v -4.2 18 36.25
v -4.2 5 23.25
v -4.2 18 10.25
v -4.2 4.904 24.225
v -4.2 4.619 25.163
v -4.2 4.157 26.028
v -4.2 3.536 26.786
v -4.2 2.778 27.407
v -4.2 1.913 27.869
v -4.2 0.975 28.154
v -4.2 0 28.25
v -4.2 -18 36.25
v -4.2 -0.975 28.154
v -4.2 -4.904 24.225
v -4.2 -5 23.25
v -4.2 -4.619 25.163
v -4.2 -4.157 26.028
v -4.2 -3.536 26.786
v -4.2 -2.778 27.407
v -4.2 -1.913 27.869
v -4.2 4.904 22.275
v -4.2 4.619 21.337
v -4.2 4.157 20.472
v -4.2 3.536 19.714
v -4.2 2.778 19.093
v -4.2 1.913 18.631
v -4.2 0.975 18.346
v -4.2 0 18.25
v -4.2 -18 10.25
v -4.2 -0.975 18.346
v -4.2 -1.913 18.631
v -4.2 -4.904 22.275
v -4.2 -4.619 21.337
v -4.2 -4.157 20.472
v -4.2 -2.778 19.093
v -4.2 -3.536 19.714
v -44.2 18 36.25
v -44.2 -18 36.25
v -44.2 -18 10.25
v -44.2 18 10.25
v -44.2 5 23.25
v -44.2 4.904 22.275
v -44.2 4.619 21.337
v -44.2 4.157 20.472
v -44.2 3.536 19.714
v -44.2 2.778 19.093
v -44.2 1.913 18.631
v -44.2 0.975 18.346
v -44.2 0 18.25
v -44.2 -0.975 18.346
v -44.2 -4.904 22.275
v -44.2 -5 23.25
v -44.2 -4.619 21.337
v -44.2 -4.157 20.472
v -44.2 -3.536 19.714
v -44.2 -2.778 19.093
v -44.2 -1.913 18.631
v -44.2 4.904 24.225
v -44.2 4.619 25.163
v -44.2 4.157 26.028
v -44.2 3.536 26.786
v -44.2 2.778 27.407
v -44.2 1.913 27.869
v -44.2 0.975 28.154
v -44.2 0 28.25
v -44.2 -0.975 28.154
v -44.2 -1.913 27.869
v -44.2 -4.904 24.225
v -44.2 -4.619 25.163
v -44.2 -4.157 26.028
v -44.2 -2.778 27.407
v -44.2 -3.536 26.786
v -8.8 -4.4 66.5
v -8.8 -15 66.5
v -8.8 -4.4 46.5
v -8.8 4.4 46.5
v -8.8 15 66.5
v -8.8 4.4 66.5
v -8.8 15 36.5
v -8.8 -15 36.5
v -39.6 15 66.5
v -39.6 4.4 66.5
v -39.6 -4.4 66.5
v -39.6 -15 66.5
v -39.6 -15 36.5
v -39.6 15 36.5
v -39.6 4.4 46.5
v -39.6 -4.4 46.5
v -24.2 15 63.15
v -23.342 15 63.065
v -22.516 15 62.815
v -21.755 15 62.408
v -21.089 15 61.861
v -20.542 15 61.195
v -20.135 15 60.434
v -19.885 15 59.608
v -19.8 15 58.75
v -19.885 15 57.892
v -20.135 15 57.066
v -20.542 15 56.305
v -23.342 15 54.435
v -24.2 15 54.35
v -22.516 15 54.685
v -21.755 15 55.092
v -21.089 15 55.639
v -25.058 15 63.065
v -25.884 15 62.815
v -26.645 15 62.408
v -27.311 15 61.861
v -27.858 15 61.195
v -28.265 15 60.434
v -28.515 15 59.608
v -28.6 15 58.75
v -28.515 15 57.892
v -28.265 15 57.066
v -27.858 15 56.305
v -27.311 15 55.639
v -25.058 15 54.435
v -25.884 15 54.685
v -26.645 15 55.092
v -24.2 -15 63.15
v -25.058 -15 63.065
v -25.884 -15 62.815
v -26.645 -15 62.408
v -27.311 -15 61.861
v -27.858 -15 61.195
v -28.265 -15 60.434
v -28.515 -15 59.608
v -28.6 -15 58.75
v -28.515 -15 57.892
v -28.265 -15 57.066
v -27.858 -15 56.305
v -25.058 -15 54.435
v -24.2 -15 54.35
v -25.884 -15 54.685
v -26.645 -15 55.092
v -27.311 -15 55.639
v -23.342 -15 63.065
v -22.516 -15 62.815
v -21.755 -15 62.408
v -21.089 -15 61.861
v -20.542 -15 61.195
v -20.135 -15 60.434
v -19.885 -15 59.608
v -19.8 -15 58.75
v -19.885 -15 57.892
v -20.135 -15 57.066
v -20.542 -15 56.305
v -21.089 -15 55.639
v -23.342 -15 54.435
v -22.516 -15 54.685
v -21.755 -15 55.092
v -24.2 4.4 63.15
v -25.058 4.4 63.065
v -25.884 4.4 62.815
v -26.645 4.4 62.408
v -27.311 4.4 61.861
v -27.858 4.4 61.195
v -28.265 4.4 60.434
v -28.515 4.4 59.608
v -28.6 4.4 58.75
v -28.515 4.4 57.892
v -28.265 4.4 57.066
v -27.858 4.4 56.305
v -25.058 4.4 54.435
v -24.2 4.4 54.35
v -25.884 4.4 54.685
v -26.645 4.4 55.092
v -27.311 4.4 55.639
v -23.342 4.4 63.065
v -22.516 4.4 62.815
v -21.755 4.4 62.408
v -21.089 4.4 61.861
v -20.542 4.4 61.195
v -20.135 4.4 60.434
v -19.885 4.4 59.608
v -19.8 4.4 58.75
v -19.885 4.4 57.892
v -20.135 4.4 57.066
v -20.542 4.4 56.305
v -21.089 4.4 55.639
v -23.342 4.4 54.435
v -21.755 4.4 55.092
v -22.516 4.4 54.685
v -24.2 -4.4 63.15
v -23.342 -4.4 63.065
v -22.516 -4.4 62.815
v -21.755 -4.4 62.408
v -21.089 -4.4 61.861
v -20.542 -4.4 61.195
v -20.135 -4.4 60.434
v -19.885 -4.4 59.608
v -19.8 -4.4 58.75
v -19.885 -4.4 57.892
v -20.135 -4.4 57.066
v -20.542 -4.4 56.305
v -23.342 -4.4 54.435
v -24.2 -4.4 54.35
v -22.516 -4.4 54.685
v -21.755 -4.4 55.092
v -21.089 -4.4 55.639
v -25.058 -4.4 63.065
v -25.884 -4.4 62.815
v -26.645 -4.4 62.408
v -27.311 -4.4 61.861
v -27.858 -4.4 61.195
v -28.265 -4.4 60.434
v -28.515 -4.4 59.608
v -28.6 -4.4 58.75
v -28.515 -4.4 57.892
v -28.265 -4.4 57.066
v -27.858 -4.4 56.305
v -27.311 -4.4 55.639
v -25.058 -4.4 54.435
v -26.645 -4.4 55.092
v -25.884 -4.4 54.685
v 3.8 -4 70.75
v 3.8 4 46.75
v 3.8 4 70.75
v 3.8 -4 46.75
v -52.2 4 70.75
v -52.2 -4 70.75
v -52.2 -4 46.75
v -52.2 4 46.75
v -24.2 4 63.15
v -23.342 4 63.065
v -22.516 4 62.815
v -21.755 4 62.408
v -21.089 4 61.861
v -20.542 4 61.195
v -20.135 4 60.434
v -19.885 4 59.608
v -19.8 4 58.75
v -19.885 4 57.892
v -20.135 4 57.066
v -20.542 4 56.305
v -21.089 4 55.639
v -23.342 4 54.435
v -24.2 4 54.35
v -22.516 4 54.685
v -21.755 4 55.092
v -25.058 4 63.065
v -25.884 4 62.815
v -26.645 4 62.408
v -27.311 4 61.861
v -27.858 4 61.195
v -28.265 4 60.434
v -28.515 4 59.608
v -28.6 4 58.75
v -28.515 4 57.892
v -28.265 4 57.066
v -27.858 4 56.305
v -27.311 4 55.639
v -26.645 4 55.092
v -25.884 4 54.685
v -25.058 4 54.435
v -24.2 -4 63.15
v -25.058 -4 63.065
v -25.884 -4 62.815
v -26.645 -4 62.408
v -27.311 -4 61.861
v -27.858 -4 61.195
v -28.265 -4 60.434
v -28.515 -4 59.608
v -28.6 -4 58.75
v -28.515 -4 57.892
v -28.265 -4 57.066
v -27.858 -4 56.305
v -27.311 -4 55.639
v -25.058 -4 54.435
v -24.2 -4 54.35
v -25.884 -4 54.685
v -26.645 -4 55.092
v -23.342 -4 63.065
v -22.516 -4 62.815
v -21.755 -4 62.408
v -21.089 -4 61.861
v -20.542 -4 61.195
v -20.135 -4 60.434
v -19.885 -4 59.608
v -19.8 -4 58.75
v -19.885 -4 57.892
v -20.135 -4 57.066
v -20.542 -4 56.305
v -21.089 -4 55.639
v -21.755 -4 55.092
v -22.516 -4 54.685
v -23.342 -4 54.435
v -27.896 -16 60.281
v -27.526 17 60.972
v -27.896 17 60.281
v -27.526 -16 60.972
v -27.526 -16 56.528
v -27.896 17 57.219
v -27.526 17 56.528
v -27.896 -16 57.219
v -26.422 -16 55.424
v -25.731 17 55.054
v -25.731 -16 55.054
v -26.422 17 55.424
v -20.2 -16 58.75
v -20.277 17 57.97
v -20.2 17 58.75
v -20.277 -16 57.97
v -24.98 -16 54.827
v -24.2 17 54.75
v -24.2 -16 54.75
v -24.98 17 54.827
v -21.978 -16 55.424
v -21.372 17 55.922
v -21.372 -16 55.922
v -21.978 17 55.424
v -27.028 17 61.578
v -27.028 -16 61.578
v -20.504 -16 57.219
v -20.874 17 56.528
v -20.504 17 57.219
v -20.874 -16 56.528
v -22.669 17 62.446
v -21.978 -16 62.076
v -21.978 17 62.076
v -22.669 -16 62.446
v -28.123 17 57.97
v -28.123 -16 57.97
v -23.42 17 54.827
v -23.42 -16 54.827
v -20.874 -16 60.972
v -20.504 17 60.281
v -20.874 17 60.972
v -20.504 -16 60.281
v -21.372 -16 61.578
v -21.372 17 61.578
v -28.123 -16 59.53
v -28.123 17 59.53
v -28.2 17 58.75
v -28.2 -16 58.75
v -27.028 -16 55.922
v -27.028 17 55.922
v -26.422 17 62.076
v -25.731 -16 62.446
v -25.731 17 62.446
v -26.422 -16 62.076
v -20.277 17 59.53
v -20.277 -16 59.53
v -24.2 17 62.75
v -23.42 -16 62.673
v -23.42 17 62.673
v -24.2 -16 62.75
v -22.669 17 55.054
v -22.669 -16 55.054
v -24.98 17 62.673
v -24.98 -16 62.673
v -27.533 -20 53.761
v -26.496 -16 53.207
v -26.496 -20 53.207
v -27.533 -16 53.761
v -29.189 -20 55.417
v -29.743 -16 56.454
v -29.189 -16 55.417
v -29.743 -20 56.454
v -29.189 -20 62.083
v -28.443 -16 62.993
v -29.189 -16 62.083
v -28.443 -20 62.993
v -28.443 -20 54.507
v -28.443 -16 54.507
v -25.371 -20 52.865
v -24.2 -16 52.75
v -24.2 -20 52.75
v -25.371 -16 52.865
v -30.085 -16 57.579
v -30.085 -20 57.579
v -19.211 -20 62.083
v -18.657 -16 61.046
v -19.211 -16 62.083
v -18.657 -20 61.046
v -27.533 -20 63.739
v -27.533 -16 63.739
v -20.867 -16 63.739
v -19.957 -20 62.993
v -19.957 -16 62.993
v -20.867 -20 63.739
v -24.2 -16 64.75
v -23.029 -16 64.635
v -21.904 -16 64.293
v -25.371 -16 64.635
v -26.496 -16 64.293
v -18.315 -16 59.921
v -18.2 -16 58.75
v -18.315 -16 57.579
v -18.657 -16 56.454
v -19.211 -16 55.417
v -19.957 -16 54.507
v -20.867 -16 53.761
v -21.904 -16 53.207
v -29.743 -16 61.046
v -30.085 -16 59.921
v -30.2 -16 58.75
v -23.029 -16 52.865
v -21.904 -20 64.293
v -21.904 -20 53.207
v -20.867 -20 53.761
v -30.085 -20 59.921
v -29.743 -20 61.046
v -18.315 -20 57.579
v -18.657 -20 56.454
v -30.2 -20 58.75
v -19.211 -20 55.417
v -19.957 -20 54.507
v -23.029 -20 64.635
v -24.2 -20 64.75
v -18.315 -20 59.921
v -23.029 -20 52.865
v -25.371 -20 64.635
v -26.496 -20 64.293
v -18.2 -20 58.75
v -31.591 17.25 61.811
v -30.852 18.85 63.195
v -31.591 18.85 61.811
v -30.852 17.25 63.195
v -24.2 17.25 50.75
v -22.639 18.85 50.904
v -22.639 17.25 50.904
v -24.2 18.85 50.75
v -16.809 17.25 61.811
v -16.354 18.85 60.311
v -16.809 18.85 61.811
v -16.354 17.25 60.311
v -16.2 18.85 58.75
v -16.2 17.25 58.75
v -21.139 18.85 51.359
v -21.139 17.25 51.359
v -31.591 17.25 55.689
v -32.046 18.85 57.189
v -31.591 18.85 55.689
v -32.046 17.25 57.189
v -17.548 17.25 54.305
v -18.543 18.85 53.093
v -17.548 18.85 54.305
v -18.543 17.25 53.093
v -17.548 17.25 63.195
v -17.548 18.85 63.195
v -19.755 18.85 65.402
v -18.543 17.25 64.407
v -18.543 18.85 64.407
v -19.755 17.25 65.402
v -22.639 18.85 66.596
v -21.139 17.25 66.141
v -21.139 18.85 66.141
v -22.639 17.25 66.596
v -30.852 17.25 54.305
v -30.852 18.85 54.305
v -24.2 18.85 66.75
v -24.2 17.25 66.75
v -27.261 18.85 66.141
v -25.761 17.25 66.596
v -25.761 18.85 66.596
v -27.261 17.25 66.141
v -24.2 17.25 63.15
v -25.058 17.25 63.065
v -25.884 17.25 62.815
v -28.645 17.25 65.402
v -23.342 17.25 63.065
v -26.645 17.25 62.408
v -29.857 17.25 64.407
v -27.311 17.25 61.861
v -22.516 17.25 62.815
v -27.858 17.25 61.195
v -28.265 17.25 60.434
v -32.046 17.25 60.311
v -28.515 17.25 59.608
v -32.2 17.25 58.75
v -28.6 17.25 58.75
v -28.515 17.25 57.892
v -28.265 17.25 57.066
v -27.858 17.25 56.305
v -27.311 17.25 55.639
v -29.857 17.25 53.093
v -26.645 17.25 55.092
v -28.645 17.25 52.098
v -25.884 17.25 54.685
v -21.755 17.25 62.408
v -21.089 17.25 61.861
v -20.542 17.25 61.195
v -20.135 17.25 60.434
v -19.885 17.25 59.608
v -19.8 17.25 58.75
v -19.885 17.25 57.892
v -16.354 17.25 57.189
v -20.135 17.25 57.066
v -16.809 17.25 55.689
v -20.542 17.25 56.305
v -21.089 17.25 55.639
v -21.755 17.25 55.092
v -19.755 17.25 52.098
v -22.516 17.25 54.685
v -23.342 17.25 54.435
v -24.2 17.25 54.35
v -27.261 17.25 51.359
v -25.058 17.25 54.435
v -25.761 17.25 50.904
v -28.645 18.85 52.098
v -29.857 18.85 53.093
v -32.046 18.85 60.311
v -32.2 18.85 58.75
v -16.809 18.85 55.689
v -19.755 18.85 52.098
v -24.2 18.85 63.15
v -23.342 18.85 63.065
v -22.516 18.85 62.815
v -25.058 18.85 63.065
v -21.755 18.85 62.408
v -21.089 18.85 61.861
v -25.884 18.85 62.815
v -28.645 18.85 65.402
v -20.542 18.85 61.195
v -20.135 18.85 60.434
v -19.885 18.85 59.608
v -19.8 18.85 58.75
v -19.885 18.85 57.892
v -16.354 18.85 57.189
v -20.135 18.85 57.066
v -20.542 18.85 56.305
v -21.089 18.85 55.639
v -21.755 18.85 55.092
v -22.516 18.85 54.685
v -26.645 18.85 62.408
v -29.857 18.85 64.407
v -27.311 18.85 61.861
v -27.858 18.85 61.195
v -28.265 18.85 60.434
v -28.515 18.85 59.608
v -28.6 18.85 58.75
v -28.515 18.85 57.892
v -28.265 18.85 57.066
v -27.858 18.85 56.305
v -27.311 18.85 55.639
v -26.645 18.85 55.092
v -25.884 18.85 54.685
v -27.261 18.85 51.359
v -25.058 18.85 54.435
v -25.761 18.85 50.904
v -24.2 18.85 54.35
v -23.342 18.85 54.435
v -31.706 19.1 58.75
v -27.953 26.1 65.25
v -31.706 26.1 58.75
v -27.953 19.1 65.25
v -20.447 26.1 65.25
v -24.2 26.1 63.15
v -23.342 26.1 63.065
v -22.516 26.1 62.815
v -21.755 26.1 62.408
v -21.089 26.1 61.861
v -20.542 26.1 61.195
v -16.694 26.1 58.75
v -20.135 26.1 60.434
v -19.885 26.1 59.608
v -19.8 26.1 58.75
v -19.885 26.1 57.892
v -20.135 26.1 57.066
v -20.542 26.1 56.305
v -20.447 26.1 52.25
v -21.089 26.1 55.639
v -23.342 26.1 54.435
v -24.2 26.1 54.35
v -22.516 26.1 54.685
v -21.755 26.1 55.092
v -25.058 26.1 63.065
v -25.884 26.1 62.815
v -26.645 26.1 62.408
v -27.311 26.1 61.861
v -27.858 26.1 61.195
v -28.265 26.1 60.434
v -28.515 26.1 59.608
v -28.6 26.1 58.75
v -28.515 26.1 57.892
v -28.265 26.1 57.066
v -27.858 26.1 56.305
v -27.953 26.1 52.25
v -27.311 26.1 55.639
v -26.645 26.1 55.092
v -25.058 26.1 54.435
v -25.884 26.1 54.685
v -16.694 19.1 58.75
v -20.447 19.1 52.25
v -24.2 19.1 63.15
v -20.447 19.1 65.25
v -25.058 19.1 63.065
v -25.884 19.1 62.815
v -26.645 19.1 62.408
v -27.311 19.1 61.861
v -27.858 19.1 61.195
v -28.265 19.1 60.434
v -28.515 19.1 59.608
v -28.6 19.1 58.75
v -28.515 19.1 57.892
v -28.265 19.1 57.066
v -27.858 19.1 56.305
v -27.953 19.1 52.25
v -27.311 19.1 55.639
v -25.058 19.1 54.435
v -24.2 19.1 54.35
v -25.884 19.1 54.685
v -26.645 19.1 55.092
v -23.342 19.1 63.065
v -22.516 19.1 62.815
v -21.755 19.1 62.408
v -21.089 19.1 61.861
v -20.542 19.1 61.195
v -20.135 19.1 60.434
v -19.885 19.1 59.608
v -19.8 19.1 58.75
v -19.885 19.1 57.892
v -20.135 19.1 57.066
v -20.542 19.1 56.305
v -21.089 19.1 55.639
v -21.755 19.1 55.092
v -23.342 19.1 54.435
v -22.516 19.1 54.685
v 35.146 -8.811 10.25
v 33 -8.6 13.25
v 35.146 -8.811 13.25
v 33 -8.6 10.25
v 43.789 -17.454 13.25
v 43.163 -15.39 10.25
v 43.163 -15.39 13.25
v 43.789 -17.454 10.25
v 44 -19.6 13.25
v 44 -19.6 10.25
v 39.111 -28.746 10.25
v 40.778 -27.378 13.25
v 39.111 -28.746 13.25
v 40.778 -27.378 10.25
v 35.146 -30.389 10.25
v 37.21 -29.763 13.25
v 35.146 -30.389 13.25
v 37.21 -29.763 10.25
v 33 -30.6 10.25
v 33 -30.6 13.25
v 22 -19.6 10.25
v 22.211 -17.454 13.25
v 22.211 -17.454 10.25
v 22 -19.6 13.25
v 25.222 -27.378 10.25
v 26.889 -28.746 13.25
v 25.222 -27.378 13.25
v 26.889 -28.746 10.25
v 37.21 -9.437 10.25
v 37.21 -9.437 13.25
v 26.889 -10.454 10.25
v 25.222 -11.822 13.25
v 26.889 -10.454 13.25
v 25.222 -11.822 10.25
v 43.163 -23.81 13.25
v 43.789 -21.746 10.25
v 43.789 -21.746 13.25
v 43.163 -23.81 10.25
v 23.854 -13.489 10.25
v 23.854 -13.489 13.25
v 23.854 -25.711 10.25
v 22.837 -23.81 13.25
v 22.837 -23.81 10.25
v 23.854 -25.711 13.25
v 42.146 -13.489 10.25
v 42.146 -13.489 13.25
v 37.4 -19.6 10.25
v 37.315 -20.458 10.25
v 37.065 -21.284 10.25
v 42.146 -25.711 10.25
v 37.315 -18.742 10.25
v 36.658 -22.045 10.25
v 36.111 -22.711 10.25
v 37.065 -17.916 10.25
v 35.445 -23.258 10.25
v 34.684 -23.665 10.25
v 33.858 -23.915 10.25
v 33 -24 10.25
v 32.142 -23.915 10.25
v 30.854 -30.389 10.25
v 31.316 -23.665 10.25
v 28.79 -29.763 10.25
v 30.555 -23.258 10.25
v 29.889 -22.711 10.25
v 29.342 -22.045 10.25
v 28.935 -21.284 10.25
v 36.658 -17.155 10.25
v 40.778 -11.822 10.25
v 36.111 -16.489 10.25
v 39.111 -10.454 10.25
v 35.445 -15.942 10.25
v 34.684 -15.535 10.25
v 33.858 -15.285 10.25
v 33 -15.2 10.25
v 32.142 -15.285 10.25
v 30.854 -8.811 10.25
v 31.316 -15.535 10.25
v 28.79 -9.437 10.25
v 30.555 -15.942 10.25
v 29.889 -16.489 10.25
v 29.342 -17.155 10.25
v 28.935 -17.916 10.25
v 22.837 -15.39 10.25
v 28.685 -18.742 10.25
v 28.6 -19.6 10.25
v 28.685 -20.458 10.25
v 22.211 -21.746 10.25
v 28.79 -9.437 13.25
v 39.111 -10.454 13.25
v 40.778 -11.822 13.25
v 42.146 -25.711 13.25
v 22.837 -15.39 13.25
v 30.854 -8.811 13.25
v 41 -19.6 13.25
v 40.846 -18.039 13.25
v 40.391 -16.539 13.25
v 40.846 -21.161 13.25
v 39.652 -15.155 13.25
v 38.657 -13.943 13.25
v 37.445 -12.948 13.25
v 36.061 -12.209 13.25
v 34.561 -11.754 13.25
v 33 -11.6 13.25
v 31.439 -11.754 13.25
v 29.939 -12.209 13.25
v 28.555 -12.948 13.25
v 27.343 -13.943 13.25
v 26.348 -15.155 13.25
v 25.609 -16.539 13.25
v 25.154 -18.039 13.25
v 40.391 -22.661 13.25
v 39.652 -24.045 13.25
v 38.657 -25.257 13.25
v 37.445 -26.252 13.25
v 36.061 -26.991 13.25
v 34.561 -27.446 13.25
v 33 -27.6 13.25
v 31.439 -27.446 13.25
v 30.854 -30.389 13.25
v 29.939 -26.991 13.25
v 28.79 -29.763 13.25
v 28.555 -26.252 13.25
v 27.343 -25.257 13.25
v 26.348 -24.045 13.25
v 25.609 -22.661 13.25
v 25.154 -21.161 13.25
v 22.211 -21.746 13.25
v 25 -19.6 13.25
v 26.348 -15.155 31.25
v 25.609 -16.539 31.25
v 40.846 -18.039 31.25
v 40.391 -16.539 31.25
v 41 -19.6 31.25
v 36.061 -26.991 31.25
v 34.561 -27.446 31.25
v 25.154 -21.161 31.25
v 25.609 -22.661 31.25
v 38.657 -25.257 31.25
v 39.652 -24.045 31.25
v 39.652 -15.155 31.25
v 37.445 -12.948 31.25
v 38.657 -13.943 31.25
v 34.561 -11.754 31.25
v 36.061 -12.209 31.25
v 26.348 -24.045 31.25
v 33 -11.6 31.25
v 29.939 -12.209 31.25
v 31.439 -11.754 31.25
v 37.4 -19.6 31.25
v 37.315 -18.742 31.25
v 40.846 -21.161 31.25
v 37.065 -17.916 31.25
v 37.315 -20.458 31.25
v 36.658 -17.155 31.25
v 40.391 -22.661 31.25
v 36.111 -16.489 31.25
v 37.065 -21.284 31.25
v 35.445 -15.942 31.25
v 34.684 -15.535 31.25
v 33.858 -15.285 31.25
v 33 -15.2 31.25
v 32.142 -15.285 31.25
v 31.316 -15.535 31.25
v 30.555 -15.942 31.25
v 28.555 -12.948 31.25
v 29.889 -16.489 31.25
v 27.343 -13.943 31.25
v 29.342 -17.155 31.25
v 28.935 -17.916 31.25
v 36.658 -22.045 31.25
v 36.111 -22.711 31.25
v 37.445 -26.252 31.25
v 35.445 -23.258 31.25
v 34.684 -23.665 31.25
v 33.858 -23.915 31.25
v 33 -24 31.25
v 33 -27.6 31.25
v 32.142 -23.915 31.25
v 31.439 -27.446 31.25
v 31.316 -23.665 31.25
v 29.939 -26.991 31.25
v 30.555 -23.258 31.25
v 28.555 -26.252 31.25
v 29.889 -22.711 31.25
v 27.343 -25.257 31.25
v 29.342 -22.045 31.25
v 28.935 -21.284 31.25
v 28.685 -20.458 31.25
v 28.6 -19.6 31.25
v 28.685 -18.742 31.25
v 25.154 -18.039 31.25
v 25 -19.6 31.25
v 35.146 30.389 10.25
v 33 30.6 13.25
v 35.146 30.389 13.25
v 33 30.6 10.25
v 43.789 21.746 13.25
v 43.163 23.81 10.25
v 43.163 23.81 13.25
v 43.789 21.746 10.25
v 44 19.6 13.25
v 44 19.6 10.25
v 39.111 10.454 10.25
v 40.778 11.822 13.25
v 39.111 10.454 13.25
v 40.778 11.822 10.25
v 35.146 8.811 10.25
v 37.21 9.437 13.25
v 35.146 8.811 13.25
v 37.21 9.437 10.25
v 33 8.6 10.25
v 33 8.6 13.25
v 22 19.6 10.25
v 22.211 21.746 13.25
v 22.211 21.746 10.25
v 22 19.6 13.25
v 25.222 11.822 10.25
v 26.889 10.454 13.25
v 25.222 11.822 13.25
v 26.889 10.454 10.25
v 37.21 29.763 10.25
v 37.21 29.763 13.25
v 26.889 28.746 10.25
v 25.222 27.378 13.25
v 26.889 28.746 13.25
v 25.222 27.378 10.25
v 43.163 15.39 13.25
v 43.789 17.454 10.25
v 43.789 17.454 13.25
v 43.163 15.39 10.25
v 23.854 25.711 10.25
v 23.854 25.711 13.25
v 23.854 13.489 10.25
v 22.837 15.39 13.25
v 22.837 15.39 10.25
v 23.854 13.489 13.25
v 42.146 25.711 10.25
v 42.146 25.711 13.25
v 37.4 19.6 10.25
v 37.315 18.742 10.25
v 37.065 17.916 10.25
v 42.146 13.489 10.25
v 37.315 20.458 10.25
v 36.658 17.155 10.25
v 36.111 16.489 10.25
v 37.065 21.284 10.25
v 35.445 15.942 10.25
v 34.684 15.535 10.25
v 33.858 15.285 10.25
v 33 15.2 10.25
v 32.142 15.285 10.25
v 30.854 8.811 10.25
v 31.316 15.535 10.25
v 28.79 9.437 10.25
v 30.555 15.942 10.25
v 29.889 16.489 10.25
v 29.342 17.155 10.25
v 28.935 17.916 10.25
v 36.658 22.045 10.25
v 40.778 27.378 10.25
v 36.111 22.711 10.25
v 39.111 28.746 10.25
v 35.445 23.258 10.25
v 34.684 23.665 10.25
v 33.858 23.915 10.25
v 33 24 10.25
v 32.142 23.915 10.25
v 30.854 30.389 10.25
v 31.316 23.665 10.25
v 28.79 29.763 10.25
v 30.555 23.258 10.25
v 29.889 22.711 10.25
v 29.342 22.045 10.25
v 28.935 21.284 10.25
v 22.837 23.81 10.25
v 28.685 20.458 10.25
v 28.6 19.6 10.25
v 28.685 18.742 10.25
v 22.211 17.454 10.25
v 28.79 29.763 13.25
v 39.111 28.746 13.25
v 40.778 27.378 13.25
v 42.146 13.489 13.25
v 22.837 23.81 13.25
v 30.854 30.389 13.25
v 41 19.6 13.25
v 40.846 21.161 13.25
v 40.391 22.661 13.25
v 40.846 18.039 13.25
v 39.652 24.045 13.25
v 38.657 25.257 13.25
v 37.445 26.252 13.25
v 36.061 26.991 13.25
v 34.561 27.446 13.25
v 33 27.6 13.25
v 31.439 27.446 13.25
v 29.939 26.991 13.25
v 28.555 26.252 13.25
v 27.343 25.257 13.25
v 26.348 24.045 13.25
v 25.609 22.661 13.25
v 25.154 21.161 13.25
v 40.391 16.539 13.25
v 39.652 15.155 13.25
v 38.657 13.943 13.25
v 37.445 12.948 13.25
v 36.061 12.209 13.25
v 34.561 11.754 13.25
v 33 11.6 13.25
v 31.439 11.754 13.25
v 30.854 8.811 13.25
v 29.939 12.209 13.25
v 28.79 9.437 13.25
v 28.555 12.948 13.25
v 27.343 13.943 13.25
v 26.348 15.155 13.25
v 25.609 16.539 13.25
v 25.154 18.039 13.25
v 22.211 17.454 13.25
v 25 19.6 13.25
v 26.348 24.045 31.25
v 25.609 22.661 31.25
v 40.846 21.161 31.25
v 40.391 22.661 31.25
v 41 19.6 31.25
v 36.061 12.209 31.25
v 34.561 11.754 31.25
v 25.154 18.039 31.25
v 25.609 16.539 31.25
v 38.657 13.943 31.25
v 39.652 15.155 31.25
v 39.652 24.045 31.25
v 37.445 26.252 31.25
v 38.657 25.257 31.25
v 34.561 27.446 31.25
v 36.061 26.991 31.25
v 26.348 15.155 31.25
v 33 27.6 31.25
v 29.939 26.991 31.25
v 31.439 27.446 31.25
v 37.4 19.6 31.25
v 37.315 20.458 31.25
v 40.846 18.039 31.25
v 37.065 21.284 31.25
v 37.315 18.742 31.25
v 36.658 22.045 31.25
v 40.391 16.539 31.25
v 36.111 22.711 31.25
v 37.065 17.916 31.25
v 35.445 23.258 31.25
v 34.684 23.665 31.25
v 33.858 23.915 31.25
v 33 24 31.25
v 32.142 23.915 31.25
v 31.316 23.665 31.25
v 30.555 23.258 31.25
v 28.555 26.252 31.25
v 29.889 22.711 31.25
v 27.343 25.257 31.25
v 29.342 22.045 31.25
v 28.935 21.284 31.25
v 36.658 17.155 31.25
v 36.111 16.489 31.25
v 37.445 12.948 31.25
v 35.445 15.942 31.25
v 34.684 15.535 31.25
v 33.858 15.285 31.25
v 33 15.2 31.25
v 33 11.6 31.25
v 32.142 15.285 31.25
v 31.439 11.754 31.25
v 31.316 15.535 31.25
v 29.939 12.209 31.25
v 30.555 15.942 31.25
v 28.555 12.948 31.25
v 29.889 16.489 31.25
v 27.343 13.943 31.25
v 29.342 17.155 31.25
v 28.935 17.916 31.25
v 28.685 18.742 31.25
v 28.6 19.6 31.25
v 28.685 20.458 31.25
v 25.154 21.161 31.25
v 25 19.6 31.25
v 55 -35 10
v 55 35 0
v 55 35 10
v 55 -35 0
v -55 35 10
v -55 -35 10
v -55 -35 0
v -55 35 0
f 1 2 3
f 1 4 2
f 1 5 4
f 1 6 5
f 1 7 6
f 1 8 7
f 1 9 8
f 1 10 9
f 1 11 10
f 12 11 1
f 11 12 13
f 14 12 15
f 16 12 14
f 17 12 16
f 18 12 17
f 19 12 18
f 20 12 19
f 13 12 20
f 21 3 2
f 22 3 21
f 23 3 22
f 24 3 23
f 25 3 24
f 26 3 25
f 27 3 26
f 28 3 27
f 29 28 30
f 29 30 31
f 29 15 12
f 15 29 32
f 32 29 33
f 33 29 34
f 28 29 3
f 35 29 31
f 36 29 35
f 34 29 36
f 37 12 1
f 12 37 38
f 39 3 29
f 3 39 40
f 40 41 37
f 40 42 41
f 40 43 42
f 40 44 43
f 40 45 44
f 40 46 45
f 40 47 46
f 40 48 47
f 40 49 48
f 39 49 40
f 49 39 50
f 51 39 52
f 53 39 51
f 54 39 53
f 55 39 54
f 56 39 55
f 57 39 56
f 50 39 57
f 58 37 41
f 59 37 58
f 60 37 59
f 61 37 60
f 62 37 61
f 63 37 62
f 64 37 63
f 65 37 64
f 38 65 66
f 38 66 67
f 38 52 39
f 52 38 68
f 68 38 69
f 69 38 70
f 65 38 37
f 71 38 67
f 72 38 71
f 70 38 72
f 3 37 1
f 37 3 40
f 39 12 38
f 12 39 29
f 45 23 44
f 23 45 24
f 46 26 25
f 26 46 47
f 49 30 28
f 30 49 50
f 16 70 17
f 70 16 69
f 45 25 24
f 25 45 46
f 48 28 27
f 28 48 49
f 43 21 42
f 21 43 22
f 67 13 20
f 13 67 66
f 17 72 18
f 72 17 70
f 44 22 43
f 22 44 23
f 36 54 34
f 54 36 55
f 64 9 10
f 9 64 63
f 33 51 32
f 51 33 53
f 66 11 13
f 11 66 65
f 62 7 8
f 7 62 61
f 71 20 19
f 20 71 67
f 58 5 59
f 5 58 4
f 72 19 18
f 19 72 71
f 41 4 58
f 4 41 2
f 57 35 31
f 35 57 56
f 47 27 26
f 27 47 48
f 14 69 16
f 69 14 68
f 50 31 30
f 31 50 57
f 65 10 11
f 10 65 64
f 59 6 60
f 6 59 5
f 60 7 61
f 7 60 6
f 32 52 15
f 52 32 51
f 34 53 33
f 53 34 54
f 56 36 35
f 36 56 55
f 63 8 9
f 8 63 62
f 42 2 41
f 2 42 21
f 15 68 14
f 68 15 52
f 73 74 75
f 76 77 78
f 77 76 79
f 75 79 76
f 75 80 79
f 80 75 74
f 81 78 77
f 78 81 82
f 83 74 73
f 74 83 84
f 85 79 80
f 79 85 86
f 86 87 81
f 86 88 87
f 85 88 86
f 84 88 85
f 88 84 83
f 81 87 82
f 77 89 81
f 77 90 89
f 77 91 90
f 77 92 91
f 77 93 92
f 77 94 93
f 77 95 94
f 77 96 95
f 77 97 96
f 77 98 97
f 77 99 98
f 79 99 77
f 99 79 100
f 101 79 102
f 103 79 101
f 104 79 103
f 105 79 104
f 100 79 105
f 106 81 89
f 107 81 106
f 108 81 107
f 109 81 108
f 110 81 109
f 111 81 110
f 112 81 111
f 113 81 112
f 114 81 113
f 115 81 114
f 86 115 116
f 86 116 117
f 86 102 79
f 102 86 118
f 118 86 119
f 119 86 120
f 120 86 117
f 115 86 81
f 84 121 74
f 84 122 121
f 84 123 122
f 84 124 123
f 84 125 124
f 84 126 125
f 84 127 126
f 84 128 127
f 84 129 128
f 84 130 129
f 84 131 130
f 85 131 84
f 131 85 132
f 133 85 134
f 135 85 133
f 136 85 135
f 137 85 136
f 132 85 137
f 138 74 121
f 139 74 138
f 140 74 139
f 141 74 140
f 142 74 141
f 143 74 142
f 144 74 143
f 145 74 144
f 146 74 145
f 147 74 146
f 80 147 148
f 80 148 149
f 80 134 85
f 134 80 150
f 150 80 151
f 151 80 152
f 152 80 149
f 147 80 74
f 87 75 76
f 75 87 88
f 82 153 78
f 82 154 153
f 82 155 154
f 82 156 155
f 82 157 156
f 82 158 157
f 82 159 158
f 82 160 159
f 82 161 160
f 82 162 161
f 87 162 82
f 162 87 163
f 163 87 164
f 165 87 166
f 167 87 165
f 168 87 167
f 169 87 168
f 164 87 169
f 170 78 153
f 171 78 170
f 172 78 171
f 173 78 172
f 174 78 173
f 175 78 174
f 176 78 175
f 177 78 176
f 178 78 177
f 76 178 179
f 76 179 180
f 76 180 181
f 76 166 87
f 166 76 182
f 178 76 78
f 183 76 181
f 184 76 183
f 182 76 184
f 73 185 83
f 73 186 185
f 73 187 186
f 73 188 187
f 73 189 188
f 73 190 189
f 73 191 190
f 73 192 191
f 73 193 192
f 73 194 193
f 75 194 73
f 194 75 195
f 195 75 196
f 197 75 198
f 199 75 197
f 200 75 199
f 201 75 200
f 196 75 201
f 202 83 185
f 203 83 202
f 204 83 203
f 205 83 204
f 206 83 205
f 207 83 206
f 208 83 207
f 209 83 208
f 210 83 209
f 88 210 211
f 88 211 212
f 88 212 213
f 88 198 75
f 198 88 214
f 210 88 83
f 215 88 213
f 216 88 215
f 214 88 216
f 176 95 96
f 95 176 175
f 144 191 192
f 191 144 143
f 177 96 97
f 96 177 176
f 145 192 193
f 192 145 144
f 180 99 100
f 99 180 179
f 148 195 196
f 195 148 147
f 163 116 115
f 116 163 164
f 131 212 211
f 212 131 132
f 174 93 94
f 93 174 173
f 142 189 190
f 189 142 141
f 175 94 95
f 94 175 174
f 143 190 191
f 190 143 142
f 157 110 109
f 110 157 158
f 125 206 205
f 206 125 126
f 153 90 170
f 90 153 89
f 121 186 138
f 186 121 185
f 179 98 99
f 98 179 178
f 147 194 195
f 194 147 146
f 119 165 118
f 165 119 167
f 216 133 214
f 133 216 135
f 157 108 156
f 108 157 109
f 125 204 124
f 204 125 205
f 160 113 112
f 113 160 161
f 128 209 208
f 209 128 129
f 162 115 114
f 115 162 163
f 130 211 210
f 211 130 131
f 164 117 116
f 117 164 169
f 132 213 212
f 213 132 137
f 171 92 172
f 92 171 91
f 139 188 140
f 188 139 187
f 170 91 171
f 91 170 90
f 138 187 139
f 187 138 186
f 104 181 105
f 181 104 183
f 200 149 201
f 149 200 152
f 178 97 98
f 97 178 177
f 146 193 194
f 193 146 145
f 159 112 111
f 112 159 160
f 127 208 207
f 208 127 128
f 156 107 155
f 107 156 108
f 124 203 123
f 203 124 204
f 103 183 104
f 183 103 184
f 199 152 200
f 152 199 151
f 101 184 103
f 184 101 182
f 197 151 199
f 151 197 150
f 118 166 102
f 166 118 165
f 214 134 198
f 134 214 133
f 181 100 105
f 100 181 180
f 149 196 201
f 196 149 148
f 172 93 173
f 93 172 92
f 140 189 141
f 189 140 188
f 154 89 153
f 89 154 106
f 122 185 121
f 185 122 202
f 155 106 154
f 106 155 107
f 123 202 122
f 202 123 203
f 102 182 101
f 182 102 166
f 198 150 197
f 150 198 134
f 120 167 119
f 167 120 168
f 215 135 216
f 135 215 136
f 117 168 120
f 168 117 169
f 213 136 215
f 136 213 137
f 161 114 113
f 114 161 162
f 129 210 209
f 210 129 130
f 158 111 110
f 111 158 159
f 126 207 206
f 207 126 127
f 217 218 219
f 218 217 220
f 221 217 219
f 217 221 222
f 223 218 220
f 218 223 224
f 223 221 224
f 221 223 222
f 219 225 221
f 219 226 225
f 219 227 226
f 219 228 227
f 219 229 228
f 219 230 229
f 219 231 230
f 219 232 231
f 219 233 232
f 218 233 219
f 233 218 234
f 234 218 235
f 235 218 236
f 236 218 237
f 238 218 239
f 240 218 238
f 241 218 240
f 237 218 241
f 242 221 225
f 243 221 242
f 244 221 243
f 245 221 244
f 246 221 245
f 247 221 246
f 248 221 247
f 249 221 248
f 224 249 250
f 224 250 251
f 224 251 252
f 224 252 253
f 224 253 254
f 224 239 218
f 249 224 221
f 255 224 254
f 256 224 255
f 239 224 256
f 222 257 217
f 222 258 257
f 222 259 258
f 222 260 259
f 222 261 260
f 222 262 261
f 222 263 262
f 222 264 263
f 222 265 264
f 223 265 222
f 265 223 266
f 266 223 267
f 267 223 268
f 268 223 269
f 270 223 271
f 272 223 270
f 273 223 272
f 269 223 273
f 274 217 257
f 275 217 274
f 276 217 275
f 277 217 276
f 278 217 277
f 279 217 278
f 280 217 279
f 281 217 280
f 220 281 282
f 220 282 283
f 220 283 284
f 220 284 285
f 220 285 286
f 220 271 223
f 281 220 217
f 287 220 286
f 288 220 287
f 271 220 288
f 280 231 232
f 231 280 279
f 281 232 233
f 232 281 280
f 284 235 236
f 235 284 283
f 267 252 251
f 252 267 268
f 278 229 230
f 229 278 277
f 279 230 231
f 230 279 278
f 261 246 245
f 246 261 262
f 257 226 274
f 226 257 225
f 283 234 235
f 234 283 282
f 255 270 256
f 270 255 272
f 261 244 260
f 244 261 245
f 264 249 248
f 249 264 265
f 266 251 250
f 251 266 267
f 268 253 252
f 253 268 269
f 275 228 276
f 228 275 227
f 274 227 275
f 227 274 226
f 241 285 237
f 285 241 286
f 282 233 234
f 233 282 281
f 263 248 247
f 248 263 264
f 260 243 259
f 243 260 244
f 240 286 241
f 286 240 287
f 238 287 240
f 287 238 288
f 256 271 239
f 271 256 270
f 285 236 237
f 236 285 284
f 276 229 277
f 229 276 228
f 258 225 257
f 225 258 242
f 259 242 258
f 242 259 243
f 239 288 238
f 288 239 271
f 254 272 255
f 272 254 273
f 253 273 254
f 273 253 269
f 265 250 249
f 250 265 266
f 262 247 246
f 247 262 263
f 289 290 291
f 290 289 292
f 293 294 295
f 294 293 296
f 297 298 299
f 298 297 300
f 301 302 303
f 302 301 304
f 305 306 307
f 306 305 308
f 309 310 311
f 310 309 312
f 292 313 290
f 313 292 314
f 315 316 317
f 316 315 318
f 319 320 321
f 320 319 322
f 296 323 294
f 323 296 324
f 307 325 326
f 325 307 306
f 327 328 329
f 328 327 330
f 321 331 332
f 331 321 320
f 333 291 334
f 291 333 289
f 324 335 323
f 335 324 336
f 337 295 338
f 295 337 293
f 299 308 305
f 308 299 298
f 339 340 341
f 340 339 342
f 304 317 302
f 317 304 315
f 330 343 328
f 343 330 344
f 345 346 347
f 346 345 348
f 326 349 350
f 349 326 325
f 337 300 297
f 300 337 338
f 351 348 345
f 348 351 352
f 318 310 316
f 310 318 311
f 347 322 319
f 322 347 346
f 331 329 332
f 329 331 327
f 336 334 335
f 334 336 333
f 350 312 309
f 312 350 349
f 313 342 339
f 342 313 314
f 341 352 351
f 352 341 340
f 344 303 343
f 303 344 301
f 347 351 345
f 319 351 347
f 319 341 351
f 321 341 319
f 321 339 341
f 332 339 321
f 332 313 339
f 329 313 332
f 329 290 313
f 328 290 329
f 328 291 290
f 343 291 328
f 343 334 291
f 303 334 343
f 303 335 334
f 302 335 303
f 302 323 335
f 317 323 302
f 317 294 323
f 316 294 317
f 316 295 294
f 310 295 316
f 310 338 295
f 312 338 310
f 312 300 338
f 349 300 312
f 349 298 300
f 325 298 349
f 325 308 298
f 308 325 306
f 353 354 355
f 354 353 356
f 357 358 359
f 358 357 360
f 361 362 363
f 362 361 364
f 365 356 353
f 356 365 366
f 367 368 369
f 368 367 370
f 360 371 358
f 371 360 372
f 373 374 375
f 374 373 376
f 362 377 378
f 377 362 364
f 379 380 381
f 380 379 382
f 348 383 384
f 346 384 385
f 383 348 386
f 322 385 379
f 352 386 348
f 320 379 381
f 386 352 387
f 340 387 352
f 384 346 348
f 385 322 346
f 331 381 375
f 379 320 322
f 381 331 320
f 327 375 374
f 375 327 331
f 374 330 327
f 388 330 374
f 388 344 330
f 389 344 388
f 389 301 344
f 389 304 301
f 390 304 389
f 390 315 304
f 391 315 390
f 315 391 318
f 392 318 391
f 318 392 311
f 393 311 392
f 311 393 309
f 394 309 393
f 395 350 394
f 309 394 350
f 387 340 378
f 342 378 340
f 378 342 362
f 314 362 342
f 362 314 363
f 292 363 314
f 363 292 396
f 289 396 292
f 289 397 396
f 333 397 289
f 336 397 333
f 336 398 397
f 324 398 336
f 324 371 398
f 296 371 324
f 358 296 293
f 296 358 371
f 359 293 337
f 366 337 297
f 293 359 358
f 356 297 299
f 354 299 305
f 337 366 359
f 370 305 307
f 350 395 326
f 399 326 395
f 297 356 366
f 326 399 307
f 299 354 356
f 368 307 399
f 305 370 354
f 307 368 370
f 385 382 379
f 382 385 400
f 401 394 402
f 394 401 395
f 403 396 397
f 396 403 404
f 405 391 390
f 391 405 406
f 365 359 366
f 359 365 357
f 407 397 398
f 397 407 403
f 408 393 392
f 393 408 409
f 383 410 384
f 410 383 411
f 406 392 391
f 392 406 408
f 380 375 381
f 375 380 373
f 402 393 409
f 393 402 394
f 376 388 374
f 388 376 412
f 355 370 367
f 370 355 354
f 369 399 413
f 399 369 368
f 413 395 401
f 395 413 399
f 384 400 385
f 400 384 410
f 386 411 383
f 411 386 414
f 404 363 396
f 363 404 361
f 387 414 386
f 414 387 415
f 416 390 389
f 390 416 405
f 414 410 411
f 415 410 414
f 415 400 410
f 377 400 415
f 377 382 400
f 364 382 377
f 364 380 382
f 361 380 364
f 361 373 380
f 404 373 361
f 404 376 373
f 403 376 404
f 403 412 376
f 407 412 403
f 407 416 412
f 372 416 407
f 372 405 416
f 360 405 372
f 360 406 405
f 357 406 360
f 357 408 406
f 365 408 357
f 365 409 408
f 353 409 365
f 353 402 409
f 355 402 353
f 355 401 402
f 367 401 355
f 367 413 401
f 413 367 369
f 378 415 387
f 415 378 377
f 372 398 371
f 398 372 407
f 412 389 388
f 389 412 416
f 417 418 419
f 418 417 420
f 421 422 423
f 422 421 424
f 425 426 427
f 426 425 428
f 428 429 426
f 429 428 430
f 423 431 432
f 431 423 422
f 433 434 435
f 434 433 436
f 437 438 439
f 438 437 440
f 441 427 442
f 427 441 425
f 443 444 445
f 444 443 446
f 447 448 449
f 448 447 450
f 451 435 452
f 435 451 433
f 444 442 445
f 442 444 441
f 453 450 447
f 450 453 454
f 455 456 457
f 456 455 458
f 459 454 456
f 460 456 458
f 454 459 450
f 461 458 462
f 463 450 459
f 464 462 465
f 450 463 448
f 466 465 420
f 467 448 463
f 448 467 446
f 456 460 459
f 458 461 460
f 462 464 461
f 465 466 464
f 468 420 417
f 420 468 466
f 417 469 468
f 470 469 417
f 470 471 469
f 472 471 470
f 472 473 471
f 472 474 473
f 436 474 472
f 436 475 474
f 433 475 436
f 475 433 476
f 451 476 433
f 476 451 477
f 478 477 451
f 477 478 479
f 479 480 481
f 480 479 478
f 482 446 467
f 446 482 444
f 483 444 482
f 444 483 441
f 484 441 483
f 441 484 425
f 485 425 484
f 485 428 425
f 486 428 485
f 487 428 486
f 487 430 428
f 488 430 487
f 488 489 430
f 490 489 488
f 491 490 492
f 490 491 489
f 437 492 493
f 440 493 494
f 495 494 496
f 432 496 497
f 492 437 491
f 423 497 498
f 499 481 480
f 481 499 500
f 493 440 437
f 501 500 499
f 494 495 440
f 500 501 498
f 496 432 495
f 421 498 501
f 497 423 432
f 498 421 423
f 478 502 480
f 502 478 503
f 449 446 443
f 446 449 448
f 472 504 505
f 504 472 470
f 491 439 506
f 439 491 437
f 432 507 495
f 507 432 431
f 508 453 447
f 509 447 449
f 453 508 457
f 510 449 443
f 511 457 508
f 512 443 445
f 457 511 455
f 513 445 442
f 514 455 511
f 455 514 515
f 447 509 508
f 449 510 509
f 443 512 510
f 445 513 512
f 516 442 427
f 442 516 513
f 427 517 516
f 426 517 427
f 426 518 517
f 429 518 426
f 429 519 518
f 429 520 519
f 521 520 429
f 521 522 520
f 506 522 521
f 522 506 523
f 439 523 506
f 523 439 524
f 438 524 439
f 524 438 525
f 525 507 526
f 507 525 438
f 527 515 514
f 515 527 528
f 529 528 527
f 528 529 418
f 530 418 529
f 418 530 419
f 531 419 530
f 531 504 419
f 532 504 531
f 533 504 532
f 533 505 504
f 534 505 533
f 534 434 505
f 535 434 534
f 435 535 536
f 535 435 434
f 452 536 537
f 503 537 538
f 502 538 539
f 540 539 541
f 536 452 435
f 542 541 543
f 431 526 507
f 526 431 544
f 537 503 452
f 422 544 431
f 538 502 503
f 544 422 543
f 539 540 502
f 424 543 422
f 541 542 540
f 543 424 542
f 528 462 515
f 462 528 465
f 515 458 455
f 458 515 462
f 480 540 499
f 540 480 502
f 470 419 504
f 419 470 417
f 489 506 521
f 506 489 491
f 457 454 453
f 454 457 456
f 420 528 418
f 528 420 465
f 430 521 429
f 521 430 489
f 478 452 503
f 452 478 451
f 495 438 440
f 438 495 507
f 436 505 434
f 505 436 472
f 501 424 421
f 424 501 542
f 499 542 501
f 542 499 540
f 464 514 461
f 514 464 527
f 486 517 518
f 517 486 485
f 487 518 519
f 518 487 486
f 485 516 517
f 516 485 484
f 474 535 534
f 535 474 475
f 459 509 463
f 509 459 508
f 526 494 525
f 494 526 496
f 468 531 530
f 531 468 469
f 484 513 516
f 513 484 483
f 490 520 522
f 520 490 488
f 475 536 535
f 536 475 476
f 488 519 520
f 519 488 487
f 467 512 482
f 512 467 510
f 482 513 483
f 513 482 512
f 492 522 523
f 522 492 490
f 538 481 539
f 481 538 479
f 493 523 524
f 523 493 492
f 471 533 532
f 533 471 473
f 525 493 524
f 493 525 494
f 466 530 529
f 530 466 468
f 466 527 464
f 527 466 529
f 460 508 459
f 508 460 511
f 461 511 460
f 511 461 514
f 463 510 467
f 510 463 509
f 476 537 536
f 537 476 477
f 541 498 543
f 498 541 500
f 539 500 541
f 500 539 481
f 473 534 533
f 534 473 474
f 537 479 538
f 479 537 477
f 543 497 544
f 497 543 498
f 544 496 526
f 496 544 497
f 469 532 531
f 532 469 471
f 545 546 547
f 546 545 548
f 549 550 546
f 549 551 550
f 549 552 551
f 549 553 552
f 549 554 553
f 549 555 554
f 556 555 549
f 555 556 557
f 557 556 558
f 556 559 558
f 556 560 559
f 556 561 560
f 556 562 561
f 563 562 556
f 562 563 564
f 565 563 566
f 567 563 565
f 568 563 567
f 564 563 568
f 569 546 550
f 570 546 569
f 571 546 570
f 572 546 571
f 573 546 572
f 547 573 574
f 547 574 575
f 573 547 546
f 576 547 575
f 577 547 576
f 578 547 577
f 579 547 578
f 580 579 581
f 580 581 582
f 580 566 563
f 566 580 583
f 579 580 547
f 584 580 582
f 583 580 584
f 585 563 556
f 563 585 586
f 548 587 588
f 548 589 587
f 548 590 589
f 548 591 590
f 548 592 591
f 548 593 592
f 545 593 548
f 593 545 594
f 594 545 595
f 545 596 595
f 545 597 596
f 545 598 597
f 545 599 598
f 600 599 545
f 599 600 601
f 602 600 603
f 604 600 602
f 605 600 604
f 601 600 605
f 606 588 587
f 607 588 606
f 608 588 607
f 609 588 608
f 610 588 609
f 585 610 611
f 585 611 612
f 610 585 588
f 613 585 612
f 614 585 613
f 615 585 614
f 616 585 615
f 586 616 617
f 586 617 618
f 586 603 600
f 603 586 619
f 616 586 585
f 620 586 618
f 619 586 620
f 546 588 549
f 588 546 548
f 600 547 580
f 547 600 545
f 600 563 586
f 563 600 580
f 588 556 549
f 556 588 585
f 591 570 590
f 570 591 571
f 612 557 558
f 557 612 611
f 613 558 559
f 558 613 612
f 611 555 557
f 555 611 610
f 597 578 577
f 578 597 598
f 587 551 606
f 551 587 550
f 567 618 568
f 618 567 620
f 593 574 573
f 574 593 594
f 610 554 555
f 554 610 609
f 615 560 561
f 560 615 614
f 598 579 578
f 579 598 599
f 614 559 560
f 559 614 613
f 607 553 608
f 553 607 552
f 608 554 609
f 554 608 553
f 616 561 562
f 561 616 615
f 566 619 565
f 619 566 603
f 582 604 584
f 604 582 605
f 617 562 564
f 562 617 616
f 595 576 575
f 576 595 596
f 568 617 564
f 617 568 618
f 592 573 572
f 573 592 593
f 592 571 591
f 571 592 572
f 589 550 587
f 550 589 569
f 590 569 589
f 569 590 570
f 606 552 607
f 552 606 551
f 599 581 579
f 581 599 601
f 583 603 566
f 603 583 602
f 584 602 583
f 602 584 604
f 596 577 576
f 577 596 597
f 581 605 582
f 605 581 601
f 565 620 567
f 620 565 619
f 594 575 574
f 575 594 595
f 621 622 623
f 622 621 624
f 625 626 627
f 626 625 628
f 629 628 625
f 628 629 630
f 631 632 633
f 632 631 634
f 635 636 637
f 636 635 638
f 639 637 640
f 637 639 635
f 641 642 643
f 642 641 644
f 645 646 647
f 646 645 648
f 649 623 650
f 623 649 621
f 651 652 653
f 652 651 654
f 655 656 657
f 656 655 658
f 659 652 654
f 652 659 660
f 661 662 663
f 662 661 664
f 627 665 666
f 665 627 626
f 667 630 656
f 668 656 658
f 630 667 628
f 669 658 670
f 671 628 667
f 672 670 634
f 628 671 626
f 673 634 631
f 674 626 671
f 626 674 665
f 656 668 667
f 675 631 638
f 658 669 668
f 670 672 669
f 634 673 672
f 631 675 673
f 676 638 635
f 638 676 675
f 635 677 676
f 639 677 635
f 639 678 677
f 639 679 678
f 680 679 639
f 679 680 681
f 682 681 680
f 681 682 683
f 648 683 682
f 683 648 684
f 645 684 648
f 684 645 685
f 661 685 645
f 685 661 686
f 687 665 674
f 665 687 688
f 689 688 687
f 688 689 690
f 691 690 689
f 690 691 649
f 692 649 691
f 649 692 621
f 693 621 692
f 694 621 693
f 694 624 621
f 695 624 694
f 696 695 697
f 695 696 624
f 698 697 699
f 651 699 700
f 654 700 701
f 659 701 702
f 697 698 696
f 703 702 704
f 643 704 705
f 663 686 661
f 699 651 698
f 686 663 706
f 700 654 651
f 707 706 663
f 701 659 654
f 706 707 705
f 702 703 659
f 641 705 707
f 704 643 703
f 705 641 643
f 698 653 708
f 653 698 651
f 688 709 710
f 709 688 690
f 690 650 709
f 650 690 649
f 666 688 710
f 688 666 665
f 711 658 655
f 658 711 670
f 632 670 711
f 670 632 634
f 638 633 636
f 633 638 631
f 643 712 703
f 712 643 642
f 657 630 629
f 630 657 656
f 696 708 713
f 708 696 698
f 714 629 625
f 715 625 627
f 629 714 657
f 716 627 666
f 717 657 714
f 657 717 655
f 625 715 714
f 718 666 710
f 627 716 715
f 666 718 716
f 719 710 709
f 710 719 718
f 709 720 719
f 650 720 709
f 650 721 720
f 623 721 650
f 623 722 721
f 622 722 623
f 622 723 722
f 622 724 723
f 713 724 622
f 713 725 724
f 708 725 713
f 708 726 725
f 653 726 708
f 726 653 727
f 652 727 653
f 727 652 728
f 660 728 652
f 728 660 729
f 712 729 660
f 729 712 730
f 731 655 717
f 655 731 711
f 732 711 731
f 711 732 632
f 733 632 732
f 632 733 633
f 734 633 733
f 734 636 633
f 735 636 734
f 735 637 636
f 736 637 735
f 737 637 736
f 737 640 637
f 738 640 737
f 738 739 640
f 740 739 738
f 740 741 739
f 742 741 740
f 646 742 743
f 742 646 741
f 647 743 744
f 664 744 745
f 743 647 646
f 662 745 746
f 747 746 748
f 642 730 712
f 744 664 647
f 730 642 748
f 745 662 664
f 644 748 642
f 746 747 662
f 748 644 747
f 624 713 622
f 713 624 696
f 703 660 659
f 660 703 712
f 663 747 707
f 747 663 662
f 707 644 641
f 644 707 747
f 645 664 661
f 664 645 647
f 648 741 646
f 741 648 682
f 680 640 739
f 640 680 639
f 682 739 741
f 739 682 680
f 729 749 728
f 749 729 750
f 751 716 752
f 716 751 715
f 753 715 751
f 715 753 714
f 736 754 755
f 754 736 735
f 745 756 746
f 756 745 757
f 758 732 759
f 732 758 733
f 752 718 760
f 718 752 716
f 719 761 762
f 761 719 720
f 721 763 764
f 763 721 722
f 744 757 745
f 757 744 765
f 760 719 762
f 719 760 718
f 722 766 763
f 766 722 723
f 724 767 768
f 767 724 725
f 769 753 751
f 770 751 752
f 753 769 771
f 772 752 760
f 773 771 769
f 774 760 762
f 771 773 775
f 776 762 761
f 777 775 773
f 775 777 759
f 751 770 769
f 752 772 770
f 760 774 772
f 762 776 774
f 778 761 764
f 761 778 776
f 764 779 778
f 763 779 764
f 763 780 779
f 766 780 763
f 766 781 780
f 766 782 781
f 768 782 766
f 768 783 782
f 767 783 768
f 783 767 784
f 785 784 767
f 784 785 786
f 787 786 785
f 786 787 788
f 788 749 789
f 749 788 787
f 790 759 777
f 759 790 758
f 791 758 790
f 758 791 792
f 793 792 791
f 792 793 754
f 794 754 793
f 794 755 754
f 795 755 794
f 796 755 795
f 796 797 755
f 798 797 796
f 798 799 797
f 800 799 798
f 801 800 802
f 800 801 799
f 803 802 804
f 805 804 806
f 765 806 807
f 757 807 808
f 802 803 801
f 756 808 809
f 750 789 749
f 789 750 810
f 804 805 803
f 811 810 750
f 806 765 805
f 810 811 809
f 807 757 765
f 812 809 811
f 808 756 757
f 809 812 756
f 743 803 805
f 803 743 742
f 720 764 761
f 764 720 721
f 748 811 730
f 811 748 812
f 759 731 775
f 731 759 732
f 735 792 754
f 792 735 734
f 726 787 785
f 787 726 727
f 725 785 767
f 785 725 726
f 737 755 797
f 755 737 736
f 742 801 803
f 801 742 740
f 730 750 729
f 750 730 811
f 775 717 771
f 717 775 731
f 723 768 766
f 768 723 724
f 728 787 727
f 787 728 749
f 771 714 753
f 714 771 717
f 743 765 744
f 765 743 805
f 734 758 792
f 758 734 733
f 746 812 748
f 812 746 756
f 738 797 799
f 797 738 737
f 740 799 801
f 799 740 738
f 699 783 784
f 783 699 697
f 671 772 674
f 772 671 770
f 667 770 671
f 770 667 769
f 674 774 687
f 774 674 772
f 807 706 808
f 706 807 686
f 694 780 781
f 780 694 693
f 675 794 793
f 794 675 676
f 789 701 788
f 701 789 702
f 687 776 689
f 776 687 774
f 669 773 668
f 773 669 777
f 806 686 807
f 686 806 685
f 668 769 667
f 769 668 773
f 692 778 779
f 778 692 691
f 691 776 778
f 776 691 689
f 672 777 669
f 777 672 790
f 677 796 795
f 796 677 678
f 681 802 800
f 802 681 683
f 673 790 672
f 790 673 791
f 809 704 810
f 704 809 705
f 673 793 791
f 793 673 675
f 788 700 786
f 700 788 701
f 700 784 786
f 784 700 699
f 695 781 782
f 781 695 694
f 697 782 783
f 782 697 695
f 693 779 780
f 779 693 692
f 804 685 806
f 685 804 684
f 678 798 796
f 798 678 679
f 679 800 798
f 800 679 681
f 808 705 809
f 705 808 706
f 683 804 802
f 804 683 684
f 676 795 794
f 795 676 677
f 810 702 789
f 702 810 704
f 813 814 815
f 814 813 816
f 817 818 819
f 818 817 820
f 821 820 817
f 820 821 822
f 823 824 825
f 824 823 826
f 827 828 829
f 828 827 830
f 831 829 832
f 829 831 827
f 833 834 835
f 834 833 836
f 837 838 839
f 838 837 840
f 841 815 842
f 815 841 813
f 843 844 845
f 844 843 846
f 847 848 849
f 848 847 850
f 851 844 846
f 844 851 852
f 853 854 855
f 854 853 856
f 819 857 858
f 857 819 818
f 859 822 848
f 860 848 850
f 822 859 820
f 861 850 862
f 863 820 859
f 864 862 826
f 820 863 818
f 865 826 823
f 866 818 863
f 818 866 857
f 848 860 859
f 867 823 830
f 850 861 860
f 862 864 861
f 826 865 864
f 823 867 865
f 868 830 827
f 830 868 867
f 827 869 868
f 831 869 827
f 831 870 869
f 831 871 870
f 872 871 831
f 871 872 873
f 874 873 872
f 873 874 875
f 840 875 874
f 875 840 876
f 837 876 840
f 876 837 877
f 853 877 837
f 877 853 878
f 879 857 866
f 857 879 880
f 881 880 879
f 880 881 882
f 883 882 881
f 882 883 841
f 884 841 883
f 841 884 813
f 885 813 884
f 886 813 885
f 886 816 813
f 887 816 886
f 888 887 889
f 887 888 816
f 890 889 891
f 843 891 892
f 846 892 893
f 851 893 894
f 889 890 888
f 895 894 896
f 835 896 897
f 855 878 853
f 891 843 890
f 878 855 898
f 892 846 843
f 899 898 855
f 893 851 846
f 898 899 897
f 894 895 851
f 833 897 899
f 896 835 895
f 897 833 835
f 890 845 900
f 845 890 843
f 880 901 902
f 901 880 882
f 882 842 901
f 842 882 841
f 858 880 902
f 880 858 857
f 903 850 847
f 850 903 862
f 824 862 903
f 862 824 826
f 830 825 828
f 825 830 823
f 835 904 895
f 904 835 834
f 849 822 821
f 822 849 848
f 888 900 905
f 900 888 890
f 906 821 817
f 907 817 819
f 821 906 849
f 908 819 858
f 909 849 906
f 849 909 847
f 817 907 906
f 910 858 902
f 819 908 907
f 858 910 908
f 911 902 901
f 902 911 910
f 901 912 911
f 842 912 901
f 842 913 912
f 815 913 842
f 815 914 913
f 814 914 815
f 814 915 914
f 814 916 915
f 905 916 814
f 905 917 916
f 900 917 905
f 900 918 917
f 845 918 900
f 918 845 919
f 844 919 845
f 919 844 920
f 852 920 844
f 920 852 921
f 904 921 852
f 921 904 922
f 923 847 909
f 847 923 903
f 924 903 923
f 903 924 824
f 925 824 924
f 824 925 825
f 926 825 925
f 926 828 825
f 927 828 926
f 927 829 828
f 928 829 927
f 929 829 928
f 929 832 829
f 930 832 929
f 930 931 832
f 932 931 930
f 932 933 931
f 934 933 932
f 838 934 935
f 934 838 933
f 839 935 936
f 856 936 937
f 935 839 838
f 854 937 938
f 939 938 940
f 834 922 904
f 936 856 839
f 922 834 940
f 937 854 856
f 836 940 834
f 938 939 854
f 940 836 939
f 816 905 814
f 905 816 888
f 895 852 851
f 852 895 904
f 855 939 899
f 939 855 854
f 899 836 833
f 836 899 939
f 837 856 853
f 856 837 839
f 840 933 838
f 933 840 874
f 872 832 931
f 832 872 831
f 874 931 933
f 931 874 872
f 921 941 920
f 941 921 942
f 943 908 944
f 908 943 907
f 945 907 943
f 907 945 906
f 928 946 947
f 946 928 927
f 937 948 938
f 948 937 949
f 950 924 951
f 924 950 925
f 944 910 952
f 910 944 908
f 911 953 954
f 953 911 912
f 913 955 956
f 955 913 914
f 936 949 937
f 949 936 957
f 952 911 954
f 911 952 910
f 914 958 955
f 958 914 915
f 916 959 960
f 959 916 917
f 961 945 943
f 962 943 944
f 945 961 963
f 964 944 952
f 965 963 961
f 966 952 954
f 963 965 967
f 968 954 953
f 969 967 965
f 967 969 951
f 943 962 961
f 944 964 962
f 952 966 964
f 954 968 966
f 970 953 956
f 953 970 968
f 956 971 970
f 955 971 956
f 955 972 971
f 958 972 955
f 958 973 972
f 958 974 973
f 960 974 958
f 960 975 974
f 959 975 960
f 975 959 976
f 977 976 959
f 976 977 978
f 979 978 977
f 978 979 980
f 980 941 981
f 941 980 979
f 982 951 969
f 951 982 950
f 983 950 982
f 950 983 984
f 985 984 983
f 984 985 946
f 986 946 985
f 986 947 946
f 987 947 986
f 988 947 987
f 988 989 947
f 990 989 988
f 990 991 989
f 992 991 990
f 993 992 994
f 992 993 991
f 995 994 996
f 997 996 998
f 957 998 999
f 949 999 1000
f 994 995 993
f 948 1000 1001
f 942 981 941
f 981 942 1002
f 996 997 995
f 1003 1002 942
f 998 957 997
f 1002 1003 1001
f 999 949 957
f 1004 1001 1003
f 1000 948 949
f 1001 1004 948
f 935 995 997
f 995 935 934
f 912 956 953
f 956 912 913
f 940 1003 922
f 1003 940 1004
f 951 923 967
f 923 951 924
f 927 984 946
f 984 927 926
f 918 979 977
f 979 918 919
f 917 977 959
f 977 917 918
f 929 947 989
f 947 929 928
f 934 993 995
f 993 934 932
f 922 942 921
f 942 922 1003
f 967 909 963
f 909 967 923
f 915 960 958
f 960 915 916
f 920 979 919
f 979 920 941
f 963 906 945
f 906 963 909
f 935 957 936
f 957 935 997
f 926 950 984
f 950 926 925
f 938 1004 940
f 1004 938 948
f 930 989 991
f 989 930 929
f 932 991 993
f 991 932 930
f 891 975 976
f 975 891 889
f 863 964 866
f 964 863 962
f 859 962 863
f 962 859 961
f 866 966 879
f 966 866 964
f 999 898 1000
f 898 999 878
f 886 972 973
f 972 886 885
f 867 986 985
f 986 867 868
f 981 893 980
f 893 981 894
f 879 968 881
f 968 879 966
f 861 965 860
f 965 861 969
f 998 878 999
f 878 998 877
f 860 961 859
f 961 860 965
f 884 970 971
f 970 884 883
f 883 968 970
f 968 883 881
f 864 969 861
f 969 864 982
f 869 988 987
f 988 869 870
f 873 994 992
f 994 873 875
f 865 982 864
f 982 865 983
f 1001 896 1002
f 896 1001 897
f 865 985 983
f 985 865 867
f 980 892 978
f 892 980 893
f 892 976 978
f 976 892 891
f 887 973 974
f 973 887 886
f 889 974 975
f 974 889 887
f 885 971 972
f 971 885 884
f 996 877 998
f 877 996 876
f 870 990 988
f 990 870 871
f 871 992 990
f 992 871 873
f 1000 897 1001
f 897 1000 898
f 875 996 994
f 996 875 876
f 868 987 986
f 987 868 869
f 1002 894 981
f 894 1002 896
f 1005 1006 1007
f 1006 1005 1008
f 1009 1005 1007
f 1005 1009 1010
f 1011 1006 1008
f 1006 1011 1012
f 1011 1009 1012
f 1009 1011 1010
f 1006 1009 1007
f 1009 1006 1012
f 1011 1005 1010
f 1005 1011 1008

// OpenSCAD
$fn = 32;

// ------------------------------------------------------------------------
// Indexing jig: plate 110 x 70 mm, pin d8
// Every part is its own module, assembly() places every instance.
// ------------------------------------------------------------------------

// --- part 1 ---
module jig_plate() {
  difference() {
    translate([-55, -35, 0]) cube([110, 70, 10]);
  }
}

// --- part 2 ---
module locator_block() {
  difference() {
    translate([-20, -18, 0]) cube([40, 36, 26]);
    translate([0, 0, 13]) rotate([0, 90, 0]) cylinder(h = 42, d = 10, center = true);
  }
}

// --- part 3 ---
module index_fork() {
  difference() {
    translate([-15.4, -15, 0]) cube([30.8, 30, 30]);
    translate([-16.4, -4.4, 10]) cube([32.8, 8.8, 21]);
    translate([0, 0, 22.25]) rotate([90, 0, 0]) cylinder(h = 32, d = 8.8, center = true);
  }
}

// --- part 4 ---
module index_arm() {
  difference() {
    translate([-28, -4, 0]) cube([56, 8, 24]);
    translate([0, 0, 12]) rotate([90, 0, 0]) cylinder(h = 10, d = 8.8, center = true);
  }
}

// --- part 5 ---
module index_pin() {
  rotate([0, 90, 0]) cylinder(h = 34, d = 8, center = true);
  translate([-20, 0, 0]) rotate([0, 90, 0]) cylinder(h = 4, d = 12);
}

// --- part 6 ---
module pin_washer() {
  difference() {
      translate([0, 0, 0]) cylinder(h = 1.6, d = 16);
      translate([0, 0, -1]) cylinder(h = 3.6, d = 8.8);
    }
}

// --- part 7 ---
module lock_nut() {
  difference() {
    linear_extrude(height = 7) polygon(points = [[7.506, 0], [3.753, 6.5], [-3.753, 6.5], [-7.506, 0], [-3.753, -6.5], [3.753, -6.5]]);
    translate([0, 0, -1]) cylinder(h = 9, d = 8.8);
  }
}

// --- part 8 ---
module guide_bush_a() {
  difference() {
    union() {
      cylinder(h = 3, d = 22);
      translate([0, 0, 3]) cylinder(h = 18, d = 16);
    }
    translate([0, 0, -1]) cylinder(h = 23, d = 8.8);
  }
}

// --- part 9 ---
module guide_bush_b() {
  difference() {
    union() {
      cylinder(h = 3, d = 22);
      translate([0, 0, 3]) cylinder(h = 18, d = 16);
    }
    translate([0, 0, -1]) cylinder(h = 23, d = 8.8);
  }
}

// --- assembly ---
module assembly() {
  color([0.80, 0.24, 0.20]) translate([0, 0, 0]) rotate([0, 0, 0]) jig_plate();
  color([0.20, 0.45, 0.75]) translate([-24.2, 0, 10.25]) rotate([0, 0, 0]) locator_block();
  color([0.25, 0.62, 0.32]) translate([-24.2, 0, 36.5]) rotate([0, 0, 0]) index_fork();
  color([0.92, 0.70, 0.18]) translate([-24.2, 0, 46.75]) rotate([0, 0, 0]) index_arm();
  color([0.58, 0.35, 0.70]) translate([-24.2, 0, 58.75]) rotate([0, 0, 90]) index_pin();
  color([0.16, 0.66, 0.66]) translate([-24.2, 18.85, 58.75]) rotate([90, 0, 0]) pin_washer();
  color([0.85, 0.48, 0.18]) translate([-24.2, 26.1, 58.75]) rotate([90, 0, 0]) lock_nut();
  color([0.55, 0.60, 0.65]) translate([33, -19.6, 10.25]) rotate([0, 0, 0]) guide_bush_a();
  color([0.75, 0.30, 0.55]) translate([33, 19.6, 10.25]) rotate([0, 0, 0]) guide_bush_b();
}

assembly();
